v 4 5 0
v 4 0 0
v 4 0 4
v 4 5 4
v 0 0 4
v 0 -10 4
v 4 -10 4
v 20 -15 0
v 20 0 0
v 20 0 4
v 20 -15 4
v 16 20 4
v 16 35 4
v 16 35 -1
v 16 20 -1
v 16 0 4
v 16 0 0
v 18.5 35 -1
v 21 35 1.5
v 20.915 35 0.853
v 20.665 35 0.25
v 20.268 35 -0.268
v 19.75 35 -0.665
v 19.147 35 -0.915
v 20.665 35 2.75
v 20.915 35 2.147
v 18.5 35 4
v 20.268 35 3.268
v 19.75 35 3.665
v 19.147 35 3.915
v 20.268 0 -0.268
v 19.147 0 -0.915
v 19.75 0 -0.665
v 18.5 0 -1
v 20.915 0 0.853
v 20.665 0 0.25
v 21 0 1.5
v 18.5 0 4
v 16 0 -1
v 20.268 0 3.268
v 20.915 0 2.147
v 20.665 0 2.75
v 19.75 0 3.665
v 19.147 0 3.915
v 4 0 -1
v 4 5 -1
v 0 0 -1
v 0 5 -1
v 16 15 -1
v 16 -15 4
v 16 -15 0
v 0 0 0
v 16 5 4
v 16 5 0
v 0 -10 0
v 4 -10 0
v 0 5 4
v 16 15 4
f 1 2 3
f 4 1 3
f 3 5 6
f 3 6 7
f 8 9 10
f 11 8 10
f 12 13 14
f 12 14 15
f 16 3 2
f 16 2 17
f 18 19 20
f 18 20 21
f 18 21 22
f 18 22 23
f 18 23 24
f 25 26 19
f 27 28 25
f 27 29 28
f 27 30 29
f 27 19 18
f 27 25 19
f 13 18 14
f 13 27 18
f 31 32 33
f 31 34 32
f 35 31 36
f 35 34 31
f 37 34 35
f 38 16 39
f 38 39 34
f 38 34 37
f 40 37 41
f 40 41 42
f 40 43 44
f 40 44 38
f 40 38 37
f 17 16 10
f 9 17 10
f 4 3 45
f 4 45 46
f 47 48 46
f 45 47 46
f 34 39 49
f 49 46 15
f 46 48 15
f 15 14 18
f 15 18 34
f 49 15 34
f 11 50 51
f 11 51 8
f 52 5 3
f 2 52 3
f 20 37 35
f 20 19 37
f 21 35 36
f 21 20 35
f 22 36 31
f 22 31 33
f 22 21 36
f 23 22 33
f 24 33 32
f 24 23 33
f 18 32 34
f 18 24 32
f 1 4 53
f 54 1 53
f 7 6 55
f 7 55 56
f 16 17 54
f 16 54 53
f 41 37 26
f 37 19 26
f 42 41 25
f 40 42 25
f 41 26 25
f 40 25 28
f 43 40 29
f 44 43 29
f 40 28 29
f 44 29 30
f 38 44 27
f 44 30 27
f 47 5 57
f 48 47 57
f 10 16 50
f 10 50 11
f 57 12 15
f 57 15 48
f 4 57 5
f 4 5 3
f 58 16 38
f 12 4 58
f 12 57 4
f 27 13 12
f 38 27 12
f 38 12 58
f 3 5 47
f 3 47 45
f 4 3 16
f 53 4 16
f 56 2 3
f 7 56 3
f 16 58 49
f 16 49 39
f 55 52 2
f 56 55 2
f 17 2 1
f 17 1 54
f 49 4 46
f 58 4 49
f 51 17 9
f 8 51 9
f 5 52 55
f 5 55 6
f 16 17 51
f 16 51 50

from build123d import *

# Parameters (mm, degrees)
F0_W     = 4
F0_H     = 4
F1_DEPTH = 10
F2_DEPTH = 15
F0_W_2   = 12
F3_DEPTH = 5
F4_W     = 4
F4_H     = 5
F4_W_2   = 5
F5_DEPTH = 5
F6_R     = 2.49999


# Not quite as in the source:
# - a fillet or chamfer is up to 0.001 mm smaller than in the source, because OpenCascade refuses the exact size


with BuildPart() as f1:
    # F0 (on Front) → F1 (new body)
    with BuildSketch(Plane.XZ):
        with Locations((2, 2)):
            Rectangle(F0_W, F0_H)
    extrude(amount=F1_DEPTH)


with BuildPart() as f2:
    # F0 (on Front) → F2 (new body)
    with BuildSketch(Plane.XZ):
        with Locations((18, 2)):
            Rectangle(F0_W, F0_H)
    extrude(amount=F2_DEPTH)


with BuildPart() as f3:
    # F0 (on Front) → F3 (new body)
    with BuildSketch(Plane.XZ):
        with Locations((10, 2)):
            Rectangle(F0_W_2, F0_H)
    extrude(amount=-F3_DEPTH)


with BuildPart() as f5:
    # F4 (on face) → F5 (new body)
    with BuildSketch(Plane.XY.offset(4)):
        Polygon((16, 15), (16, 5), (21, 5), (21, 35), (16, 35), (16, 20), align=None)
        with Locations((2, 2.5)):
            Rectangle(F4_W, F4_H)
        Polygon((4, 5), (16, 15), (16, 20), (0, 5), align=None)
        with Locations((18.5, 2.5)):
            Rectangle(F4_W_2, F4_H)
    extrude(amount=-F5_DEPTH)

    # F6 (radius 2.5 in the source; OpenCascade refuses exactly that, so slightly less here)
    f6_edges = [f5.edges().sort_by_distance(p)[0] for p in [
        (21, 17.5, -1),
        (21, 17.5, 4),
    ]]
    fillet(f6_edges, radius=F6_R)


solid = Compound([f1.part, f2.part, f3.part, f5.part])
